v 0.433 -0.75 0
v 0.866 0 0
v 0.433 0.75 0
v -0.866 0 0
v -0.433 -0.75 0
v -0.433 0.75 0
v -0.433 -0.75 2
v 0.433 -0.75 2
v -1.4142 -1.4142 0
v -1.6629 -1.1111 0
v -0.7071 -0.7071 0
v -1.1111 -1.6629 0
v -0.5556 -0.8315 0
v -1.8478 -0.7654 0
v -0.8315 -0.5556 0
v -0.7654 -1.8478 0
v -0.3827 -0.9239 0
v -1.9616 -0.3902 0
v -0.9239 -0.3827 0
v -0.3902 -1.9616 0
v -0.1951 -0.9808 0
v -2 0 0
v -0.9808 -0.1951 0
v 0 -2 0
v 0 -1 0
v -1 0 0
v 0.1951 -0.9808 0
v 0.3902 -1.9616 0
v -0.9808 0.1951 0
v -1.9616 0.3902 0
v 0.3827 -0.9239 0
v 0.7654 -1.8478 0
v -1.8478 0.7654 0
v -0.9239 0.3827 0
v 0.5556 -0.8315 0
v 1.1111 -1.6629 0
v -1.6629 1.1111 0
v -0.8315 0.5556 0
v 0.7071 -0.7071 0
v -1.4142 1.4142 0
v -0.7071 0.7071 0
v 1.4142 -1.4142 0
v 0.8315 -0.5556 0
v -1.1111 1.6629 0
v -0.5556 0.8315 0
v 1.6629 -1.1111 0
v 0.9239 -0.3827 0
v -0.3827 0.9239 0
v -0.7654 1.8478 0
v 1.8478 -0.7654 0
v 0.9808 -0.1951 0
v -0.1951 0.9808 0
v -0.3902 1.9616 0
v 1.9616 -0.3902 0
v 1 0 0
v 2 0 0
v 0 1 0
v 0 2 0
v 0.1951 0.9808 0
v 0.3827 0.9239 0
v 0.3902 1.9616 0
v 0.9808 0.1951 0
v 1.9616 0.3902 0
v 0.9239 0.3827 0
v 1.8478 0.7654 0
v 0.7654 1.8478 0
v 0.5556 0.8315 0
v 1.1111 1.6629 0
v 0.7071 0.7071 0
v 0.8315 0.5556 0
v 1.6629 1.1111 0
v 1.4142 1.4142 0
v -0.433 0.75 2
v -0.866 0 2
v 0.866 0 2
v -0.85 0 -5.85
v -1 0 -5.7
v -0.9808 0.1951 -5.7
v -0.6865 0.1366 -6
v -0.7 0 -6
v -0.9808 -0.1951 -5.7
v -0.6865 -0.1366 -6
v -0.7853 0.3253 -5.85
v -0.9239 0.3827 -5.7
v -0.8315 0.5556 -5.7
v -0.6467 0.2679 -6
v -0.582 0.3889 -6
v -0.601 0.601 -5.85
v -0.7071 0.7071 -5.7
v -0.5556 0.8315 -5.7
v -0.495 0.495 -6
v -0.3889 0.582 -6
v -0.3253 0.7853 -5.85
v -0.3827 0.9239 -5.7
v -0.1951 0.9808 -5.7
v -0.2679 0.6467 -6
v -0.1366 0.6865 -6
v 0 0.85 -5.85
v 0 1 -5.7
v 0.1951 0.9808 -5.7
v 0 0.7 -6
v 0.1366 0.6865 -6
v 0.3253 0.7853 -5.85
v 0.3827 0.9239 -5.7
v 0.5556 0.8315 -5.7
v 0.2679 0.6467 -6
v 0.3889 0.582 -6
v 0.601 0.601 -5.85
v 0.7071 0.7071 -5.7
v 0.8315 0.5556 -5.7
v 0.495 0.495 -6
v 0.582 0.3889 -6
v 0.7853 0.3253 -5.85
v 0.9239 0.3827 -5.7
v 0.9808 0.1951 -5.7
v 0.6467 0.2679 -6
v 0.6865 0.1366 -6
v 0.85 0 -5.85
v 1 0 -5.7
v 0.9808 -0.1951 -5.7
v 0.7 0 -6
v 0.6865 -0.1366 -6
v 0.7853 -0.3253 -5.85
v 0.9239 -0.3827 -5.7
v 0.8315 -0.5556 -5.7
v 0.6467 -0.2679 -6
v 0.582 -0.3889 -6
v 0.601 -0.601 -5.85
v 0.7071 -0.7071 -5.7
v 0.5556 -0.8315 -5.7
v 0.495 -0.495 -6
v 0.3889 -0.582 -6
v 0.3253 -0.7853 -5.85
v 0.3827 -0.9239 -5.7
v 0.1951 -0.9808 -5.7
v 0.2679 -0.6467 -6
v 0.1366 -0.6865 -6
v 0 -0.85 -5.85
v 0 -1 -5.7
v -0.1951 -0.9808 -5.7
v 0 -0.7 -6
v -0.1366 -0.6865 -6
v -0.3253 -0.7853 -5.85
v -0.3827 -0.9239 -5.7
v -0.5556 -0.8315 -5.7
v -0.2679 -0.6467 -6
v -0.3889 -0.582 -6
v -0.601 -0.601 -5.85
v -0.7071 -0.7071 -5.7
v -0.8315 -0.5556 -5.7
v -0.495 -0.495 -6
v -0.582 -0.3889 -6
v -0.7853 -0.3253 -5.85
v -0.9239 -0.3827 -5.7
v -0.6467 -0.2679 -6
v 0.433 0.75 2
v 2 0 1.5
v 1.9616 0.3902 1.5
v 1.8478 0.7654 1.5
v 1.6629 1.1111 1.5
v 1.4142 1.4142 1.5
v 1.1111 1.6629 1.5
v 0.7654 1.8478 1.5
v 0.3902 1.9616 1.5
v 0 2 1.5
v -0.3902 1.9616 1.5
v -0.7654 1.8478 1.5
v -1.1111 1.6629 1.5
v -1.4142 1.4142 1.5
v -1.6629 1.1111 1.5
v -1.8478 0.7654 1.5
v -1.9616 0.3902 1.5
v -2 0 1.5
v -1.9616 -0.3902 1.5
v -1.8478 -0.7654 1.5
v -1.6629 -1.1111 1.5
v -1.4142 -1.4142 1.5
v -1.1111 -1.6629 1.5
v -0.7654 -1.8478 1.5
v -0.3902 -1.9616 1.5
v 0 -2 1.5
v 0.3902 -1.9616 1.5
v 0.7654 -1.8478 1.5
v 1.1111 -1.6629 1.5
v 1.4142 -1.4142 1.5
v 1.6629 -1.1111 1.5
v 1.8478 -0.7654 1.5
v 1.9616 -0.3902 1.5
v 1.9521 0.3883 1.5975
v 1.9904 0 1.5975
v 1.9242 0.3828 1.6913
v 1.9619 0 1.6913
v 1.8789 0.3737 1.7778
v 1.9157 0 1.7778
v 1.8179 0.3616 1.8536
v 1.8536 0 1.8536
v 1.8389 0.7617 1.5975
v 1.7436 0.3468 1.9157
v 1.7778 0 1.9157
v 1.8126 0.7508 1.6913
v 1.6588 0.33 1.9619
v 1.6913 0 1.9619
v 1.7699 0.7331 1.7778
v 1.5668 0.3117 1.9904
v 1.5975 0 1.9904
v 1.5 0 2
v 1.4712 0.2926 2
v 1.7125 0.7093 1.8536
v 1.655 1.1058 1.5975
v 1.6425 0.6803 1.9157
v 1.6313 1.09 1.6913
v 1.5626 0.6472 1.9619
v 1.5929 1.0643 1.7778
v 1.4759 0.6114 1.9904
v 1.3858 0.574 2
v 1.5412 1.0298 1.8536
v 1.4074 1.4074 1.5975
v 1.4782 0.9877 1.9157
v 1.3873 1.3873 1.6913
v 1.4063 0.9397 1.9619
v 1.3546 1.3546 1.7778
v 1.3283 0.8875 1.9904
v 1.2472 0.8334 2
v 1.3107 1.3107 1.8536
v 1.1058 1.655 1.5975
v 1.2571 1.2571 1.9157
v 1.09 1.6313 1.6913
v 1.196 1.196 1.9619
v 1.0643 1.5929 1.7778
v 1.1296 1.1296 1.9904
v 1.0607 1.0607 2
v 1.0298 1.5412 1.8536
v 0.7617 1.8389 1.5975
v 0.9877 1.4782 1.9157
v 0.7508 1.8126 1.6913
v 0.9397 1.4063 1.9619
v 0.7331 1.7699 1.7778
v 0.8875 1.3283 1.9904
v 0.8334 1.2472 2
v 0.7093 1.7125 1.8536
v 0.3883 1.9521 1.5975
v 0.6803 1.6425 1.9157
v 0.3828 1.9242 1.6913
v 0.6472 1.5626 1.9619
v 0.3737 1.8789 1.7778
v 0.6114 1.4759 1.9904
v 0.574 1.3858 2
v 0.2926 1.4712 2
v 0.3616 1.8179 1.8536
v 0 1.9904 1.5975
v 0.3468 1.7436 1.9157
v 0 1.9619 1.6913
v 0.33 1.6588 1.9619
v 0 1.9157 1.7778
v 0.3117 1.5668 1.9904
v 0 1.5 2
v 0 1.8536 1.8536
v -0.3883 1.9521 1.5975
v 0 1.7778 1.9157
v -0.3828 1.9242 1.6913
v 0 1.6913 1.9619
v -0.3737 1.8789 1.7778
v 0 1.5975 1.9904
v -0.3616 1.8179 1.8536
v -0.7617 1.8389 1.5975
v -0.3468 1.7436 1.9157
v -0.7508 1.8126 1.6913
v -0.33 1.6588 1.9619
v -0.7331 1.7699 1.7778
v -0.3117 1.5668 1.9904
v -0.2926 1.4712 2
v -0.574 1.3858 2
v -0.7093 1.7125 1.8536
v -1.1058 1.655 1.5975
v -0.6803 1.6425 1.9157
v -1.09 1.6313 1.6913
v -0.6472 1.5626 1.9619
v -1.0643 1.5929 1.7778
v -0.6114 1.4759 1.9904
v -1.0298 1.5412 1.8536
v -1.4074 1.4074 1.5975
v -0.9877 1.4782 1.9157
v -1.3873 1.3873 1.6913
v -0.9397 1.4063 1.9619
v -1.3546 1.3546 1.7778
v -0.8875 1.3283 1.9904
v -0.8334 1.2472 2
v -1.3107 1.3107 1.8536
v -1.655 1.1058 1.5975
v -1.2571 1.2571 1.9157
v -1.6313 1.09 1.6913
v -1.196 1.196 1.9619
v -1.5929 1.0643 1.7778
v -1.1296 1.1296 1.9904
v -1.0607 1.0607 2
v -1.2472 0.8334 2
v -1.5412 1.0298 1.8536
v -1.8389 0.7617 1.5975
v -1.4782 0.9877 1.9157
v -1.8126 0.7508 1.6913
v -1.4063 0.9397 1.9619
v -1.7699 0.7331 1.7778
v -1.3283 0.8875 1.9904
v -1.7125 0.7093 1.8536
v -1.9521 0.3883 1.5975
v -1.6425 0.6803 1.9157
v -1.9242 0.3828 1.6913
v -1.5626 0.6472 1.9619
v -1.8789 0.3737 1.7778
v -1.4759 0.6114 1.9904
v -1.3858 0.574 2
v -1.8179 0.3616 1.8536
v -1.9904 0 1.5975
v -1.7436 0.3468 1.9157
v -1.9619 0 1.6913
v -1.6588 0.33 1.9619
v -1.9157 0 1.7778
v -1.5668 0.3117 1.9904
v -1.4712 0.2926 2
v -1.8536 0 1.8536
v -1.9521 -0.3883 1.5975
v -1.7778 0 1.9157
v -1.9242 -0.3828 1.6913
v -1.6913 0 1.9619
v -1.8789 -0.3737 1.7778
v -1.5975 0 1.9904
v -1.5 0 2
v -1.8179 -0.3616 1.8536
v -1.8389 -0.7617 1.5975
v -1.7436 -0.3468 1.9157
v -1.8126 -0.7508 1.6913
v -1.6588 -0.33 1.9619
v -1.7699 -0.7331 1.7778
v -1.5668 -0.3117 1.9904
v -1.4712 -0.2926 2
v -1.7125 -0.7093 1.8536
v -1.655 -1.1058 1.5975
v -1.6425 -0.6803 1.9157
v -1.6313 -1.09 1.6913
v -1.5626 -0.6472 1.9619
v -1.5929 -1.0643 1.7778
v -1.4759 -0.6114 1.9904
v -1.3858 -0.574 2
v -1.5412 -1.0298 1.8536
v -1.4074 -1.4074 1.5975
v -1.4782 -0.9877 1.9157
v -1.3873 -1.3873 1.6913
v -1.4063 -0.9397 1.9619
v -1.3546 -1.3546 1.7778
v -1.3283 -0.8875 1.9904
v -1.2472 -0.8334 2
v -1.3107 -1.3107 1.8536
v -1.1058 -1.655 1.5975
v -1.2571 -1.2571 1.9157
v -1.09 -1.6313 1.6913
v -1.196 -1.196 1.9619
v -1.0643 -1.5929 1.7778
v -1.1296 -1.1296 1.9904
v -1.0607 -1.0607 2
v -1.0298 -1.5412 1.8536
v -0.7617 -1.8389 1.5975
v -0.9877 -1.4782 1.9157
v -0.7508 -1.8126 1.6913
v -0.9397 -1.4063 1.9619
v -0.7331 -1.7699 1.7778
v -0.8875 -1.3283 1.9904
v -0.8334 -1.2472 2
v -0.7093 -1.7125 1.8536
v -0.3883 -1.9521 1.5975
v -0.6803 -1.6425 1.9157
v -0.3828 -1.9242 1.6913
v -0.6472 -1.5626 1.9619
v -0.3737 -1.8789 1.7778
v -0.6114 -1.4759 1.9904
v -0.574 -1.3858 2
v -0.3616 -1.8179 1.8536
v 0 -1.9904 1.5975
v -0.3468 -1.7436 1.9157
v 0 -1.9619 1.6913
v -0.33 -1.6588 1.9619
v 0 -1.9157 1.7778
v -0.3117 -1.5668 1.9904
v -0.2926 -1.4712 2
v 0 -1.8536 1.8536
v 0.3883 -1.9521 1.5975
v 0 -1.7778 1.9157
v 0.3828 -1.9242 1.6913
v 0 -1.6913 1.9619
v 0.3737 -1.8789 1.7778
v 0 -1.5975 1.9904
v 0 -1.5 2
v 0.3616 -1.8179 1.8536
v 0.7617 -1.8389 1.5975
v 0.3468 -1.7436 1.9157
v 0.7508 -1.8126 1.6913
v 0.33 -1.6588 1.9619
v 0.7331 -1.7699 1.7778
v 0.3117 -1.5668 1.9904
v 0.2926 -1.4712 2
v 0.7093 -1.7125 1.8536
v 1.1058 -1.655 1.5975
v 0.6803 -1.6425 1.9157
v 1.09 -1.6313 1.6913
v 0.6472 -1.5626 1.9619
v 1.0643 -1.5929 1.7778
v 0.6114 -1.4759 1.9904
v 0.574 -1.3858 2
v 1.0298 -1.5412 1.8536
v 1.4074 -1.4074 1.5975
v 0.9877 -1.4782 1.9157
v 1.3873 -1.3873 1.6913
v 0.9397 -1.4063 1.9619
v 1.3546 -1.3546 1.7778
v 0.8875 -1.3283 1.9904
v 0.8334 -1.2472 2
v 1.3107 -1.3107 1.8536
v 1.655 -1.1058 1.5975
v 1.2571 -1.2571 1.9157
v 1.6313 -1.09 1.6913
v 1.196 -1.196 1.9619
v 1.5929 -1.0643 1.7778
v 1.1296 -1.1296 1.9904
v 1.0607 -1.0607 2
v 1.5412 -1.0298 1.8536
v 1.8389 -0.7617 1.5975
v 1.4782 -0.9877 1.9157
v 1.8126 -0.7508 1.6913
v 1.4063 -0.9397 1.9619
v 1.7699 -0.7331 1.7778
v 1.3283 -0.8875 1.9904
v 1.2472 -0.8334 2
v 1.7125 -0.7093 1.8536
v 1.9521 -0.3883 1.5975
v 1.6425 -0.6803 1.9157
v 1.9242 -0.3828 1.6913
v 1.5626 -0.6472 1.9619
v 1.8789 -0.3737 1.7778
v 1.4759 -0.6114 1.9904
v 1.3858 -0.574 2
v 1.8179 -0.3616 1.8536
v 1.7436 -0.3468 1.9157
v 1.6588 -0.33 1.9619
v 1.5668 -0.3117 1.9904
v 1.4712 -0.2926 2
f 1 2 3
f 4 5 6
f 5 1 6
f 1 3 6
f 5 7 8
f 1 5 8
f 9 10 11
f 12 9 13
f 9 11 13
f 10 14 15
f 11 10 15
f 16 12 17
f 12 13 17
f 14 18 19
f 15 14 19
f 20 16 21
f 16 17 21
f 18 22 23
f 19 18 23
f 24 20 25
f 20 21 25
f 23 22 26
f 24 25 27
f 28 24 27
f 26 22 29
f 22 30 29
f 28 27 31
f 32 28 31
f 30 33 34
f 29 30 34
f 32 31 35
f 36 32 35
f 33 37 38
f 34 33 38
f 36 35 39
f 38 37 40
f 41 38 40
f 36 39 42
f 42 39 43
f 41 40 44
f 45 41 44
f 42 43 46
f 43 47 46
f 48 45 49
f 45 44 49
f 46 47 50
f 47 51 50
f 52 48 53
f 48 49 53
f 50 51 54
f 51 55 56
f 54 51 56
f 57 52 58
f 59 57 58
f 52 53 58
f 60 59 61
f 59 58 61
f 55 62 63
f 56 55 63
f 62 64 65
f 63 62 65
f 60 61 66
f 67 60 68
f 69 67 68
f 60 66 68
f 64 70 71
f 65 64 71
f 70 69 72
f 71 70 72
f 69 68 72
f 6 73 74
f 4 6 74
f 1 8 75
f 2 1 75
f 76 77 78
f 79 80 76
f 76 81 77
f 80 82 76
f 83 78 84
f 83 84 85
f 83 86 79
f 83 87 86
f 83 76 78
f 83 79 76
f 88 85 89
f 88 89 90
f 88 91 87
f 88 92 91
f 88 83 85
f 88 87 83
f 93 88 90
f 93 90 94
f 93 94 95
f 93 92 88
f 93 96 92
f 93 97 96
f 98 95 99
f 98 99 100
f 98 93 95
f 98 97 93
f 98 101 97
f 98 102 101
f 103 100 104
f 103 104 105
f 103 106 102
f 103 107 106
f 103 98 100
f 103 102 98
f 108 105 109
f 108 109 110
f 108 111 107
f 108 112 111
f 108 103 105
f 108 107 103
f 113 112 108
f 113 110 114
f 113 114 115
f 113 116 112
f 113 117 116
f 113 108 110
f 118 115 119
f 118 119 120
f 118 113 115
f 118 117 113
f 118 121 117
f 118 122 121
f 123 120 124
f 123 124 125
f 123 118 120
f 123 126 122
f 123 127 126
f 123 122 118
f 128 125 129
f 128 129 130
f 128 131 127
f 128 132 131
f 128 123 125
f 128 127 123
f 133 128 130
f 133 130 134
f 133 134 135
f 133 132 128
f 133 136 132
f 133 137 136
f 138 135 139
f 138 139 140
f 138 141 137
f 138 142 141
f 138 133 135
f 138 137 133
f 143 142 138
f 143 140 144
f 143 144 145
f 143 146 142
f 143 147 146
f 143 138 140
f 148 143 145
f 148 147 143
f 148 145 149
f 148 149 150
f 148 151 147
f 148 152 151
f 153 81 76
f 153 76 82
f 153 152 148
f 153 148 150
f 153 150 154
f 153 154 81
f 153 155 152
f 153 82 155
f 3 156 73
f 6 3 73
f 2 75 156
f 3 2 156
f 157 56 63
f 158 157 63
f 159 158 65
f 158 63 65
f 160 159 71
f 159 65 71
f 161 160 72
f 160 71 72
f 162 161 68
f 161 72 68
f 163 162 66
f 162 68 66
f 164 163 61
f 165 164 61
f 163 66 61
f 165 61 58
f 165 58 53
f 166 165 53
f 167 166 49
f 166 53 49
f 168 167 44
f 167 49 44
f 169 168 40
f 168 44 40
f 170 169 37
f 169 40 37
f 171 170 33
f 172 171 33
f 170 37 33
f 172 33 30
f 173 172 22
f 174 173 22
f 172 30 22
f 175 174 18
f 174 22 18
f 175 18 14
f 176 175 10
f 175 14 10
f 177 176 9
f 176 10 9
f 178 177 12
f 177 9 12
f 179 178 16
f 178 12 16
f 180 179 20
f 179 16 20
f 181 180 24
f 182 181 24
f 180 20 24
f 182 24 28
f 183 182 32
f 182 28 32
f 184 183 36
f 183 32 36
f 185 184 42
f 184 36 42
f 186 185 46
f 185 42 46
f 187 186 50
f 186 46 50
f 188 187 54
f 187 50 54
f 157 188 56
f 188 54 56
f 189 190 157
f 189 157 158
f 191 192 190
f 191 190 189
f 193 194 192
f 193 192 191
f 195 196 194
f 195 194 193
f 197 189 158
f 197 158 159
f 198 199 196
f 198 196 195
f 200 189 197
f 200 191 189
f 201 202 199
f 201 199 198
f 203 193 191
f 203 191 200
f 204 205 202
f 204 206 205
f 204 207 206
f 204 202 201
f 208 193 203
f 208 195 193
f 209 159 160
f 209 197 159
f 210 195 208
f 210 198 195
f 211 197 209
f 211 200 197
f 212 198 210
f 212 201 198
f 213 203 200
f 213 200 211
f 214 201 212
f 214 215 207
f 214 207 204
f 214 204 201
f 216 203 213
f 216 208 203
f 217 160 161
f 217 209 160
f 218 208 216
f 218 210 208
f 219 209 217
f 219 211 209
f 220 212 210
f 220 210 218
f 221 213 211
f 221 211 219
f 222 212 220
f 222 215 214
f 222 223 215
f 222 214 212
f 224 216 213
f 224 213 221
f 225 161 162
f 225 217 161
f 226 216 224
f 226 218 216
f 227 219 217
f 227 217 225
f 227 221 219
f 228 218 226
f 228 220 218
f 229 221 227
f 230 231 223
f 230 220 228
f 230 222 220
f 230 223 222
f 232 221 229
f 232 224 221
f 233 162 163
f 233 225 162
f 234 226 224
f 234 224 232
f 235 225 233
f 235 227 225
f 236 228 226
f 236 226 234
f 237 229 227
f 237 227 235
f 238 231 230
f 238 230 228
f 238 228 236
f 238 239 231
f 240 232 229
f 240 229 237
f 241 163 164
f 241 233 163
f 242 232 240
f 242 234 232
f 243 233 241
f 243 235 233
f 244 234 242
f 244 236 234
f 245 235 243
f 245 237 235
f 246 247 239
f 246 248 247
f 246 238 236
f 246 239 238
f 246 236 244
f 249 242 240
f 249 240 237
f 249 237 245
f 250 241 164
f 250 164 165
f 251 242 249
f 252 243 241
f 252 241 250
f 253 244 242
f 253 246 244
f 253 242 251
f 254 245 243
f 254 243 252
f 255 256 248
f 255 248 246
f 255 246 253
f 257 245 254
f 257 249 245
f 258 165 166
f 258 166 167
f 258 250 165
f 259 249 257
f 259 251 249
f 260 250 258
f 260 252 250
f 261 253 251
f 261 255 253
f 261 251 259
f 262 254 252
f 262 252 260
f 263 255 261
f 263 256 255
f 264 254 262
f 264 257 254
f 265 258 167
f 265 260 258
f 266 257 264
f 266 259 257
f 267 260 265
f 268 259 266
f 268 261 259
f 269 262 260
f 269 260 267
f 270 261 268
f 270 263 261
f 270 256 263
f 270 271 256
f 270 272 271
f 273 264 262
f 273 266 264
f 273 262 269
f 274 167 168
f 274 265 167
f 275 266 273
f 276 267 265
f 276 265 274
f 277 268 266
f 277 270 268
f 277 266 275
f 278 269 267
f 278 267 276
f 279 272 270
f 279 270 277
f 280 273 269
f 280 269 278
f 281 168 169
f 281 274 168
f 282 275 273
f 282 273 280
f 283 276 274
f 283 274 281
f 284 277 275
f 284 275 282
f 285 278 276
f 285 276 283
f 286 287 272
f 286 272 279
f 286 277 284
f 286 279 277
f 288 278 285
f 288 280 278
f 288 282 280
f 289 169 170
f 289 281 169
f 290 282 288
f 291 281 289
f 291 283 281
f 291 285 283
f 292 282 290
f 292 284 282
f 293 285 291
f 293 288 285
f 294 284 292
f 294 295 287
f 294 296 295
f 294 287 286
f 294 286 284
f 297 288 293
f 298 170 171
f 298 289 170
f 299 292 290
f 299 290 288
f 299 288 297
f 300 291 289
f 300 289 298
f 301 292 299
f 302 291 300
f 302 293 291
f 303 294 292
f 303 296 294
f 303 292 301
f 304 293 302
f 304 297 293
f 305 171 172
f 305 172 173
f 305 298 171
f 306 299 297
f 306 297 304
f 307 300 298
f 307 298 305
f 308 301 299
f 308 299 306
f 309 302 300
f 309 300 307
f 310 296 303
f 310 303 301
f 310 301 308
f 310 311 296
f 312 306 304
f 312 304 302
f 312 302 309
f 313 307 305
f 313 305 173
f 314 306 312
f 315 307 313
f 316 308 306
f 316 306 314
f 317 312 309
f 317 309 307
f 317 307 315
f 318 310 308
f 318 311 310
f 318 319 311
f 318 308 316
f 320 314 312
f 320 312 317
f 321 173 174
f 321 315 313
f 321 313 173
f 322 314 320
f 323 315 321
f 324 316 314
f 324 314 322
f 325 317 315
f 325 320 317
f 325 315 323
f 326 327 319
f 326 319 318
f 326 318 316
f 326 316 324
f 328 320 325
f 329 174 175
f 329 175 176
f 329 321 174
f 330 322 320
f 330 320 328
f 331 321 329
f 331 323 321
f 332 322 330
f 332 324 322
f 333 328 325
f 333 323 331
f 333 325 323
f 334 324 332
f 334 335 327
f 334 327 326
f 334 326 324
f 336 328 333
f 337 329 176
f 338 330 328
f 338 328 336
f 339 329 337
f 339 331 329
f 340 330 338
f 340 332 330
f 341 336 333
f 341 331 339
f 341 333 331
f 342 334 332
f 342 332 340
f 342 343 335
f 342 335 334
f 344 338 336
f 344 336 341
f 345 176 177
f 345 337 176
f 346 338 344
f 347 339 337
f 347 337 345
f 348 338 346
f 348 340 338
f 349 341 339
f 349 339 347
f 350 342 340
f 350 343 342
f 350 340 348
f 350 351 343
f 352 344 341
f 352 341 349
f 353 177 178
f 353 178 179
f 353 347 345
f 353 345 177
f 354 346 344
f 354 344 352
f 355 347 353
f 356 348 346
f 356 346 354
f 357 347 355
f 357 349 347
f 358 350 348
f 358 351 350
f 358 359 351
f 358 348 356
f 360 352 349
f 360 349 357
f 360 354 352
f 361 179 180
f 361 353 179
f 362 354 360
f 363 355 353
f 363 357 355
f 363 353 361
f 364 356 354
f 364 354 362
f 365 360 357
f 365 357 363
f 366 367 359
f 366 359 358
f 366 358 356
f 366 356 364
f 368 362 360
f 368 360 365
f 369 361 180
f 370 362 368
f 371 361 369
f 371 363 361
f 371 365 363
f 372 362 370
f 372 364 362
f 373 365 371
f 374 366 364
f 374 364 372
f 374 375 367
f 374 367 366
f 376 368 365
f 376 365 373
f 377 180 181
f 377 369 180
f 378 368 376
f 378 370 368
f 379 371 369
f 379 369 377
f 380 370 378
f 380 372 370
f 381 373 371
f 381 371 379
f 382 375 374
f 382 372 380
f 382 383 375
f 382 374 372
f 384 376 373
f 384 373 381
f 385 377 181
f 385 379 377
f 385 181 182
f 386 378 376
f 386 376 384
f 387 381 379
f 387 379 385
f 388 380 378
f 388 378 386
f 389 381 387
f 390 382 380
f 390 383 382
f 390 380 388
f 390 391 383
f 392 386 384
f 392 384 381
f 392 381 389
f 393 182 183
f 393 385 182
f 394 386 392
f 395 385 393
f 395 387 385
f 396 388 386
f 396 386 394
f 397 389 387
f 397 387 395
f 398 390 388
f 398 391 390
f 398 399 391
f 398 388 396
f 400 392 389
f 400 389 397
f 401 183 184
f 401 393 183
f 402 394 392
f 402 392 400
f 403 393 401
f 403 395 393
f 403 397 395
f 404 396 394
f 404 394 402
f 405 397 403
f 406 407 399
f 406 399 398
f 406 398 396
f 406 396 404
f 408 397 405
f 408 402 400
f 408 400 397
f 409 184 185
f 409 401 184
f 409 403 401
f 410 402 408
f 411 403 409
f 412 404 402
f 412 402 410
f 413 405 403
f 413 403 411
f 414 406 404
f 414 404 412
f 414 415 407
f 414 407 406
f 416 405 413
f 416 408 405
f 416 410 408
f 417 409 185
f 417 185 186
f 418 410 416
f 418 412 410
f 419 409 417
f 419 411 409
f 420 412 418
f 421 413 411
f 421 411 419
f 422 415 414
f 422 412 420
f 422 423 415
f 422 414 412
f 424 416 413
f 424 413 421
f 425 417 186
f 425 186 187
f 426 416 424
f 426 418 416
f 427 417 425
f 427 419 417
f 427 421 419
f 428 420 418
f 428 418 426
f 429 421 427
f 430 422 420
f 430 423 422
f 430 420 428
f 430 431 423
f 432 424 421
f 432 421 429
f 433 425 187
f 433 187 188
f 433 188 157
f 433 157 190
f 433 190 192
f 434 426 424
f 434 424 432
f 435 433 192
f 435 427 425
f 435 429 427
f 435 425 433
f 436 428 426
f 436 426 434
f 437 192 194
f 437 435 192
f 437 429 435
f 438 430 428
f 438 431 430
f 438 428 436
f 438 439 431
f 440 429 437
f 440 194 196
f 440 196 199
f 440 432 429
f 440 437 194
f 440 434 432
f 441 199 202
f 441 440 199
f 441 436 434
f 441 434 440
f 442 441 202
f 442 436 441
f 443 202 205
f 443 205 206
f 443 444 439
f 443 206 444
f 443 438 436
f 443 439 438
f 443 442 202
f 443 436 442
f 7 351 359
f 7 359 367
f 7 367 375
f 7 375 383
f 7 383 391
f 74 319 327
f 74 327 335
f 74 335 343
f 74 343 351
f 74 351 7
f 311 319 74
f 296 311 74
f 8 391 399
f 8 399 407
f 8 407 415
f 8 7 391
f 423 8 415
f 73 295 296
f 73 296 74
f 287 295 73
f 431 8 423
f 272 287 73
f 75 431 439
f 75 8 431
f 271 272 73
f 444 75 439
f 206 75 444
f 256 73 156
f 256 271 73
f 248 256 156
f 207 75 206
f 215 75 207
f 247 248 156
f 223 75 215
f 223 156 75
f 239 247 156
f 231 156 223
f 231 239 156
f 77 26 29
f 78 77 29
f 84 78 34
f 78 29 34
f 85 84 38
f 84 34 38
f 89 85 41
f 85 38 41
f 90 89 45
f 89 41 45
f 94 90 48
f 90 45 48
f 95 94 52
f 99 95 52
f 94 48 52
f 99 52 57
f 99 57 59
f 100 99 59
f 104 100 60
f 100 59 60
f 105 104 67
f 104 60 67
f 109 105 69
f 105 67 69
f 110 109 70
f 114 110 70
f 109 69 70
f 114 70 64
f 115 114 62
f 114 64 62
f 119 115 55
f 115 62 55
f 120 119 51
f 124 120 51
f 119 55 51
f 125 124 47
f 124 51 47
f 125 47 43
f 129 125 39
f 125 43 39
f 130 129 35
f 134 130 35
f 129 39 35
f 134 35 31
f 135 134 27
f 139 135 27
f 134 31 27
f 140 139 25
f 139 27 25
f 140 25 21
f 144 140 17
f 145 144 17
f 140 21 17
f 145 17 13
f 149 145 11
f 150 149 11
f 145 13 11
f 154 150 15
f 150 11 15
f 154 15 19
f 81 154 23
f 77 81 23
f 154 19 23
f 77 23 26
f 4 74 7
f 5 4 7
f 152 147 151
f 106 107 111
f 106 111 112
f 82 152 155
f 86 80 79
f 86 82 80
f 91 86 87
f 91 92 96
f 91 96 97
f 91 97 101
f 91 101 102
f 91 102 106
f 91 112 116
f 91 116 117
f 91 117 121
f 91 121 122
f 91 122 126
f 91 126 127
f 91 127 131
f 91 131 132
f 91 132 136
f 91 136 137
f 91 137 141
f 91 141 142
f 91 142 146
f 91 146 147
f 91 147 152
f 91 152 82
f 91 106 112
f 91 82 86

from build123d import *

# Parameters (mm, degrees)
SKICA1_R                 = 2
P_IDAT_VYSUNUT_M1_DEPTH  = 2
ODEBRAT_VYSUNUT_M1_DEPTH = 2
SKICA2_R                 = 1
P_IDAT_VYSUNUT_M2_DEPTH  = 6
ZKOSEN_1_SIZE            = 0.3
ZAOBLIT1_R               = 0.5


with BuildPart() as part:
    # Skica1 → Přidat vysunutím1 (new body)
    with BuildSketch(Plane.XY):
        Circle(SKICA1_R)
    extrude(amount=P_IDAT_VYSUNUT_M1_DEPTH)

    # Skica4 → Odebrat vysunutím1 (cut)
    with BuildSketch(Plane.XY.offset(2)):
        Polygon((-0.866025404, 0), (-0.433012702, -0.75), (0.433012702, -0.75), (0.866025404, 0), (0.433012702, 0.75), (-0.433012702, 0.75), align=None)
    extrude(amount=-ODEBRAT_VYSUNUT_M1_DEPTH, mode=Mode.SUBTRACT)

    # Skica2 → Přidat vysunutím2 (add)
    with BuildSketch(Plane(origin=(0, 0, 0), x_dir=(-1, 0, 0), z_dir=(0, 0, -1))):
        Circle(SKICA2_R)
    extrude(amount=P_IDAT_VYSUNUT_M2_DEPTH)

    # Zkosení1
    zkosen_1_edges = [part.edges().sort_by_distance(p)[0] for p in [
        (1, 0, -6),
    ]]
    chamfer(zkosen_1_edges, length=ZKOSEN_1_SIZE)

    # Zaoblit1
    zaoblit1_edges = [part.edges().sort_by_distance(p)[0] for p in [
        (-2, 0, 2),
    ]]
    fillet(zaoblit1_edges, radius=ZAOBLIT1_R)


solid = part.part
